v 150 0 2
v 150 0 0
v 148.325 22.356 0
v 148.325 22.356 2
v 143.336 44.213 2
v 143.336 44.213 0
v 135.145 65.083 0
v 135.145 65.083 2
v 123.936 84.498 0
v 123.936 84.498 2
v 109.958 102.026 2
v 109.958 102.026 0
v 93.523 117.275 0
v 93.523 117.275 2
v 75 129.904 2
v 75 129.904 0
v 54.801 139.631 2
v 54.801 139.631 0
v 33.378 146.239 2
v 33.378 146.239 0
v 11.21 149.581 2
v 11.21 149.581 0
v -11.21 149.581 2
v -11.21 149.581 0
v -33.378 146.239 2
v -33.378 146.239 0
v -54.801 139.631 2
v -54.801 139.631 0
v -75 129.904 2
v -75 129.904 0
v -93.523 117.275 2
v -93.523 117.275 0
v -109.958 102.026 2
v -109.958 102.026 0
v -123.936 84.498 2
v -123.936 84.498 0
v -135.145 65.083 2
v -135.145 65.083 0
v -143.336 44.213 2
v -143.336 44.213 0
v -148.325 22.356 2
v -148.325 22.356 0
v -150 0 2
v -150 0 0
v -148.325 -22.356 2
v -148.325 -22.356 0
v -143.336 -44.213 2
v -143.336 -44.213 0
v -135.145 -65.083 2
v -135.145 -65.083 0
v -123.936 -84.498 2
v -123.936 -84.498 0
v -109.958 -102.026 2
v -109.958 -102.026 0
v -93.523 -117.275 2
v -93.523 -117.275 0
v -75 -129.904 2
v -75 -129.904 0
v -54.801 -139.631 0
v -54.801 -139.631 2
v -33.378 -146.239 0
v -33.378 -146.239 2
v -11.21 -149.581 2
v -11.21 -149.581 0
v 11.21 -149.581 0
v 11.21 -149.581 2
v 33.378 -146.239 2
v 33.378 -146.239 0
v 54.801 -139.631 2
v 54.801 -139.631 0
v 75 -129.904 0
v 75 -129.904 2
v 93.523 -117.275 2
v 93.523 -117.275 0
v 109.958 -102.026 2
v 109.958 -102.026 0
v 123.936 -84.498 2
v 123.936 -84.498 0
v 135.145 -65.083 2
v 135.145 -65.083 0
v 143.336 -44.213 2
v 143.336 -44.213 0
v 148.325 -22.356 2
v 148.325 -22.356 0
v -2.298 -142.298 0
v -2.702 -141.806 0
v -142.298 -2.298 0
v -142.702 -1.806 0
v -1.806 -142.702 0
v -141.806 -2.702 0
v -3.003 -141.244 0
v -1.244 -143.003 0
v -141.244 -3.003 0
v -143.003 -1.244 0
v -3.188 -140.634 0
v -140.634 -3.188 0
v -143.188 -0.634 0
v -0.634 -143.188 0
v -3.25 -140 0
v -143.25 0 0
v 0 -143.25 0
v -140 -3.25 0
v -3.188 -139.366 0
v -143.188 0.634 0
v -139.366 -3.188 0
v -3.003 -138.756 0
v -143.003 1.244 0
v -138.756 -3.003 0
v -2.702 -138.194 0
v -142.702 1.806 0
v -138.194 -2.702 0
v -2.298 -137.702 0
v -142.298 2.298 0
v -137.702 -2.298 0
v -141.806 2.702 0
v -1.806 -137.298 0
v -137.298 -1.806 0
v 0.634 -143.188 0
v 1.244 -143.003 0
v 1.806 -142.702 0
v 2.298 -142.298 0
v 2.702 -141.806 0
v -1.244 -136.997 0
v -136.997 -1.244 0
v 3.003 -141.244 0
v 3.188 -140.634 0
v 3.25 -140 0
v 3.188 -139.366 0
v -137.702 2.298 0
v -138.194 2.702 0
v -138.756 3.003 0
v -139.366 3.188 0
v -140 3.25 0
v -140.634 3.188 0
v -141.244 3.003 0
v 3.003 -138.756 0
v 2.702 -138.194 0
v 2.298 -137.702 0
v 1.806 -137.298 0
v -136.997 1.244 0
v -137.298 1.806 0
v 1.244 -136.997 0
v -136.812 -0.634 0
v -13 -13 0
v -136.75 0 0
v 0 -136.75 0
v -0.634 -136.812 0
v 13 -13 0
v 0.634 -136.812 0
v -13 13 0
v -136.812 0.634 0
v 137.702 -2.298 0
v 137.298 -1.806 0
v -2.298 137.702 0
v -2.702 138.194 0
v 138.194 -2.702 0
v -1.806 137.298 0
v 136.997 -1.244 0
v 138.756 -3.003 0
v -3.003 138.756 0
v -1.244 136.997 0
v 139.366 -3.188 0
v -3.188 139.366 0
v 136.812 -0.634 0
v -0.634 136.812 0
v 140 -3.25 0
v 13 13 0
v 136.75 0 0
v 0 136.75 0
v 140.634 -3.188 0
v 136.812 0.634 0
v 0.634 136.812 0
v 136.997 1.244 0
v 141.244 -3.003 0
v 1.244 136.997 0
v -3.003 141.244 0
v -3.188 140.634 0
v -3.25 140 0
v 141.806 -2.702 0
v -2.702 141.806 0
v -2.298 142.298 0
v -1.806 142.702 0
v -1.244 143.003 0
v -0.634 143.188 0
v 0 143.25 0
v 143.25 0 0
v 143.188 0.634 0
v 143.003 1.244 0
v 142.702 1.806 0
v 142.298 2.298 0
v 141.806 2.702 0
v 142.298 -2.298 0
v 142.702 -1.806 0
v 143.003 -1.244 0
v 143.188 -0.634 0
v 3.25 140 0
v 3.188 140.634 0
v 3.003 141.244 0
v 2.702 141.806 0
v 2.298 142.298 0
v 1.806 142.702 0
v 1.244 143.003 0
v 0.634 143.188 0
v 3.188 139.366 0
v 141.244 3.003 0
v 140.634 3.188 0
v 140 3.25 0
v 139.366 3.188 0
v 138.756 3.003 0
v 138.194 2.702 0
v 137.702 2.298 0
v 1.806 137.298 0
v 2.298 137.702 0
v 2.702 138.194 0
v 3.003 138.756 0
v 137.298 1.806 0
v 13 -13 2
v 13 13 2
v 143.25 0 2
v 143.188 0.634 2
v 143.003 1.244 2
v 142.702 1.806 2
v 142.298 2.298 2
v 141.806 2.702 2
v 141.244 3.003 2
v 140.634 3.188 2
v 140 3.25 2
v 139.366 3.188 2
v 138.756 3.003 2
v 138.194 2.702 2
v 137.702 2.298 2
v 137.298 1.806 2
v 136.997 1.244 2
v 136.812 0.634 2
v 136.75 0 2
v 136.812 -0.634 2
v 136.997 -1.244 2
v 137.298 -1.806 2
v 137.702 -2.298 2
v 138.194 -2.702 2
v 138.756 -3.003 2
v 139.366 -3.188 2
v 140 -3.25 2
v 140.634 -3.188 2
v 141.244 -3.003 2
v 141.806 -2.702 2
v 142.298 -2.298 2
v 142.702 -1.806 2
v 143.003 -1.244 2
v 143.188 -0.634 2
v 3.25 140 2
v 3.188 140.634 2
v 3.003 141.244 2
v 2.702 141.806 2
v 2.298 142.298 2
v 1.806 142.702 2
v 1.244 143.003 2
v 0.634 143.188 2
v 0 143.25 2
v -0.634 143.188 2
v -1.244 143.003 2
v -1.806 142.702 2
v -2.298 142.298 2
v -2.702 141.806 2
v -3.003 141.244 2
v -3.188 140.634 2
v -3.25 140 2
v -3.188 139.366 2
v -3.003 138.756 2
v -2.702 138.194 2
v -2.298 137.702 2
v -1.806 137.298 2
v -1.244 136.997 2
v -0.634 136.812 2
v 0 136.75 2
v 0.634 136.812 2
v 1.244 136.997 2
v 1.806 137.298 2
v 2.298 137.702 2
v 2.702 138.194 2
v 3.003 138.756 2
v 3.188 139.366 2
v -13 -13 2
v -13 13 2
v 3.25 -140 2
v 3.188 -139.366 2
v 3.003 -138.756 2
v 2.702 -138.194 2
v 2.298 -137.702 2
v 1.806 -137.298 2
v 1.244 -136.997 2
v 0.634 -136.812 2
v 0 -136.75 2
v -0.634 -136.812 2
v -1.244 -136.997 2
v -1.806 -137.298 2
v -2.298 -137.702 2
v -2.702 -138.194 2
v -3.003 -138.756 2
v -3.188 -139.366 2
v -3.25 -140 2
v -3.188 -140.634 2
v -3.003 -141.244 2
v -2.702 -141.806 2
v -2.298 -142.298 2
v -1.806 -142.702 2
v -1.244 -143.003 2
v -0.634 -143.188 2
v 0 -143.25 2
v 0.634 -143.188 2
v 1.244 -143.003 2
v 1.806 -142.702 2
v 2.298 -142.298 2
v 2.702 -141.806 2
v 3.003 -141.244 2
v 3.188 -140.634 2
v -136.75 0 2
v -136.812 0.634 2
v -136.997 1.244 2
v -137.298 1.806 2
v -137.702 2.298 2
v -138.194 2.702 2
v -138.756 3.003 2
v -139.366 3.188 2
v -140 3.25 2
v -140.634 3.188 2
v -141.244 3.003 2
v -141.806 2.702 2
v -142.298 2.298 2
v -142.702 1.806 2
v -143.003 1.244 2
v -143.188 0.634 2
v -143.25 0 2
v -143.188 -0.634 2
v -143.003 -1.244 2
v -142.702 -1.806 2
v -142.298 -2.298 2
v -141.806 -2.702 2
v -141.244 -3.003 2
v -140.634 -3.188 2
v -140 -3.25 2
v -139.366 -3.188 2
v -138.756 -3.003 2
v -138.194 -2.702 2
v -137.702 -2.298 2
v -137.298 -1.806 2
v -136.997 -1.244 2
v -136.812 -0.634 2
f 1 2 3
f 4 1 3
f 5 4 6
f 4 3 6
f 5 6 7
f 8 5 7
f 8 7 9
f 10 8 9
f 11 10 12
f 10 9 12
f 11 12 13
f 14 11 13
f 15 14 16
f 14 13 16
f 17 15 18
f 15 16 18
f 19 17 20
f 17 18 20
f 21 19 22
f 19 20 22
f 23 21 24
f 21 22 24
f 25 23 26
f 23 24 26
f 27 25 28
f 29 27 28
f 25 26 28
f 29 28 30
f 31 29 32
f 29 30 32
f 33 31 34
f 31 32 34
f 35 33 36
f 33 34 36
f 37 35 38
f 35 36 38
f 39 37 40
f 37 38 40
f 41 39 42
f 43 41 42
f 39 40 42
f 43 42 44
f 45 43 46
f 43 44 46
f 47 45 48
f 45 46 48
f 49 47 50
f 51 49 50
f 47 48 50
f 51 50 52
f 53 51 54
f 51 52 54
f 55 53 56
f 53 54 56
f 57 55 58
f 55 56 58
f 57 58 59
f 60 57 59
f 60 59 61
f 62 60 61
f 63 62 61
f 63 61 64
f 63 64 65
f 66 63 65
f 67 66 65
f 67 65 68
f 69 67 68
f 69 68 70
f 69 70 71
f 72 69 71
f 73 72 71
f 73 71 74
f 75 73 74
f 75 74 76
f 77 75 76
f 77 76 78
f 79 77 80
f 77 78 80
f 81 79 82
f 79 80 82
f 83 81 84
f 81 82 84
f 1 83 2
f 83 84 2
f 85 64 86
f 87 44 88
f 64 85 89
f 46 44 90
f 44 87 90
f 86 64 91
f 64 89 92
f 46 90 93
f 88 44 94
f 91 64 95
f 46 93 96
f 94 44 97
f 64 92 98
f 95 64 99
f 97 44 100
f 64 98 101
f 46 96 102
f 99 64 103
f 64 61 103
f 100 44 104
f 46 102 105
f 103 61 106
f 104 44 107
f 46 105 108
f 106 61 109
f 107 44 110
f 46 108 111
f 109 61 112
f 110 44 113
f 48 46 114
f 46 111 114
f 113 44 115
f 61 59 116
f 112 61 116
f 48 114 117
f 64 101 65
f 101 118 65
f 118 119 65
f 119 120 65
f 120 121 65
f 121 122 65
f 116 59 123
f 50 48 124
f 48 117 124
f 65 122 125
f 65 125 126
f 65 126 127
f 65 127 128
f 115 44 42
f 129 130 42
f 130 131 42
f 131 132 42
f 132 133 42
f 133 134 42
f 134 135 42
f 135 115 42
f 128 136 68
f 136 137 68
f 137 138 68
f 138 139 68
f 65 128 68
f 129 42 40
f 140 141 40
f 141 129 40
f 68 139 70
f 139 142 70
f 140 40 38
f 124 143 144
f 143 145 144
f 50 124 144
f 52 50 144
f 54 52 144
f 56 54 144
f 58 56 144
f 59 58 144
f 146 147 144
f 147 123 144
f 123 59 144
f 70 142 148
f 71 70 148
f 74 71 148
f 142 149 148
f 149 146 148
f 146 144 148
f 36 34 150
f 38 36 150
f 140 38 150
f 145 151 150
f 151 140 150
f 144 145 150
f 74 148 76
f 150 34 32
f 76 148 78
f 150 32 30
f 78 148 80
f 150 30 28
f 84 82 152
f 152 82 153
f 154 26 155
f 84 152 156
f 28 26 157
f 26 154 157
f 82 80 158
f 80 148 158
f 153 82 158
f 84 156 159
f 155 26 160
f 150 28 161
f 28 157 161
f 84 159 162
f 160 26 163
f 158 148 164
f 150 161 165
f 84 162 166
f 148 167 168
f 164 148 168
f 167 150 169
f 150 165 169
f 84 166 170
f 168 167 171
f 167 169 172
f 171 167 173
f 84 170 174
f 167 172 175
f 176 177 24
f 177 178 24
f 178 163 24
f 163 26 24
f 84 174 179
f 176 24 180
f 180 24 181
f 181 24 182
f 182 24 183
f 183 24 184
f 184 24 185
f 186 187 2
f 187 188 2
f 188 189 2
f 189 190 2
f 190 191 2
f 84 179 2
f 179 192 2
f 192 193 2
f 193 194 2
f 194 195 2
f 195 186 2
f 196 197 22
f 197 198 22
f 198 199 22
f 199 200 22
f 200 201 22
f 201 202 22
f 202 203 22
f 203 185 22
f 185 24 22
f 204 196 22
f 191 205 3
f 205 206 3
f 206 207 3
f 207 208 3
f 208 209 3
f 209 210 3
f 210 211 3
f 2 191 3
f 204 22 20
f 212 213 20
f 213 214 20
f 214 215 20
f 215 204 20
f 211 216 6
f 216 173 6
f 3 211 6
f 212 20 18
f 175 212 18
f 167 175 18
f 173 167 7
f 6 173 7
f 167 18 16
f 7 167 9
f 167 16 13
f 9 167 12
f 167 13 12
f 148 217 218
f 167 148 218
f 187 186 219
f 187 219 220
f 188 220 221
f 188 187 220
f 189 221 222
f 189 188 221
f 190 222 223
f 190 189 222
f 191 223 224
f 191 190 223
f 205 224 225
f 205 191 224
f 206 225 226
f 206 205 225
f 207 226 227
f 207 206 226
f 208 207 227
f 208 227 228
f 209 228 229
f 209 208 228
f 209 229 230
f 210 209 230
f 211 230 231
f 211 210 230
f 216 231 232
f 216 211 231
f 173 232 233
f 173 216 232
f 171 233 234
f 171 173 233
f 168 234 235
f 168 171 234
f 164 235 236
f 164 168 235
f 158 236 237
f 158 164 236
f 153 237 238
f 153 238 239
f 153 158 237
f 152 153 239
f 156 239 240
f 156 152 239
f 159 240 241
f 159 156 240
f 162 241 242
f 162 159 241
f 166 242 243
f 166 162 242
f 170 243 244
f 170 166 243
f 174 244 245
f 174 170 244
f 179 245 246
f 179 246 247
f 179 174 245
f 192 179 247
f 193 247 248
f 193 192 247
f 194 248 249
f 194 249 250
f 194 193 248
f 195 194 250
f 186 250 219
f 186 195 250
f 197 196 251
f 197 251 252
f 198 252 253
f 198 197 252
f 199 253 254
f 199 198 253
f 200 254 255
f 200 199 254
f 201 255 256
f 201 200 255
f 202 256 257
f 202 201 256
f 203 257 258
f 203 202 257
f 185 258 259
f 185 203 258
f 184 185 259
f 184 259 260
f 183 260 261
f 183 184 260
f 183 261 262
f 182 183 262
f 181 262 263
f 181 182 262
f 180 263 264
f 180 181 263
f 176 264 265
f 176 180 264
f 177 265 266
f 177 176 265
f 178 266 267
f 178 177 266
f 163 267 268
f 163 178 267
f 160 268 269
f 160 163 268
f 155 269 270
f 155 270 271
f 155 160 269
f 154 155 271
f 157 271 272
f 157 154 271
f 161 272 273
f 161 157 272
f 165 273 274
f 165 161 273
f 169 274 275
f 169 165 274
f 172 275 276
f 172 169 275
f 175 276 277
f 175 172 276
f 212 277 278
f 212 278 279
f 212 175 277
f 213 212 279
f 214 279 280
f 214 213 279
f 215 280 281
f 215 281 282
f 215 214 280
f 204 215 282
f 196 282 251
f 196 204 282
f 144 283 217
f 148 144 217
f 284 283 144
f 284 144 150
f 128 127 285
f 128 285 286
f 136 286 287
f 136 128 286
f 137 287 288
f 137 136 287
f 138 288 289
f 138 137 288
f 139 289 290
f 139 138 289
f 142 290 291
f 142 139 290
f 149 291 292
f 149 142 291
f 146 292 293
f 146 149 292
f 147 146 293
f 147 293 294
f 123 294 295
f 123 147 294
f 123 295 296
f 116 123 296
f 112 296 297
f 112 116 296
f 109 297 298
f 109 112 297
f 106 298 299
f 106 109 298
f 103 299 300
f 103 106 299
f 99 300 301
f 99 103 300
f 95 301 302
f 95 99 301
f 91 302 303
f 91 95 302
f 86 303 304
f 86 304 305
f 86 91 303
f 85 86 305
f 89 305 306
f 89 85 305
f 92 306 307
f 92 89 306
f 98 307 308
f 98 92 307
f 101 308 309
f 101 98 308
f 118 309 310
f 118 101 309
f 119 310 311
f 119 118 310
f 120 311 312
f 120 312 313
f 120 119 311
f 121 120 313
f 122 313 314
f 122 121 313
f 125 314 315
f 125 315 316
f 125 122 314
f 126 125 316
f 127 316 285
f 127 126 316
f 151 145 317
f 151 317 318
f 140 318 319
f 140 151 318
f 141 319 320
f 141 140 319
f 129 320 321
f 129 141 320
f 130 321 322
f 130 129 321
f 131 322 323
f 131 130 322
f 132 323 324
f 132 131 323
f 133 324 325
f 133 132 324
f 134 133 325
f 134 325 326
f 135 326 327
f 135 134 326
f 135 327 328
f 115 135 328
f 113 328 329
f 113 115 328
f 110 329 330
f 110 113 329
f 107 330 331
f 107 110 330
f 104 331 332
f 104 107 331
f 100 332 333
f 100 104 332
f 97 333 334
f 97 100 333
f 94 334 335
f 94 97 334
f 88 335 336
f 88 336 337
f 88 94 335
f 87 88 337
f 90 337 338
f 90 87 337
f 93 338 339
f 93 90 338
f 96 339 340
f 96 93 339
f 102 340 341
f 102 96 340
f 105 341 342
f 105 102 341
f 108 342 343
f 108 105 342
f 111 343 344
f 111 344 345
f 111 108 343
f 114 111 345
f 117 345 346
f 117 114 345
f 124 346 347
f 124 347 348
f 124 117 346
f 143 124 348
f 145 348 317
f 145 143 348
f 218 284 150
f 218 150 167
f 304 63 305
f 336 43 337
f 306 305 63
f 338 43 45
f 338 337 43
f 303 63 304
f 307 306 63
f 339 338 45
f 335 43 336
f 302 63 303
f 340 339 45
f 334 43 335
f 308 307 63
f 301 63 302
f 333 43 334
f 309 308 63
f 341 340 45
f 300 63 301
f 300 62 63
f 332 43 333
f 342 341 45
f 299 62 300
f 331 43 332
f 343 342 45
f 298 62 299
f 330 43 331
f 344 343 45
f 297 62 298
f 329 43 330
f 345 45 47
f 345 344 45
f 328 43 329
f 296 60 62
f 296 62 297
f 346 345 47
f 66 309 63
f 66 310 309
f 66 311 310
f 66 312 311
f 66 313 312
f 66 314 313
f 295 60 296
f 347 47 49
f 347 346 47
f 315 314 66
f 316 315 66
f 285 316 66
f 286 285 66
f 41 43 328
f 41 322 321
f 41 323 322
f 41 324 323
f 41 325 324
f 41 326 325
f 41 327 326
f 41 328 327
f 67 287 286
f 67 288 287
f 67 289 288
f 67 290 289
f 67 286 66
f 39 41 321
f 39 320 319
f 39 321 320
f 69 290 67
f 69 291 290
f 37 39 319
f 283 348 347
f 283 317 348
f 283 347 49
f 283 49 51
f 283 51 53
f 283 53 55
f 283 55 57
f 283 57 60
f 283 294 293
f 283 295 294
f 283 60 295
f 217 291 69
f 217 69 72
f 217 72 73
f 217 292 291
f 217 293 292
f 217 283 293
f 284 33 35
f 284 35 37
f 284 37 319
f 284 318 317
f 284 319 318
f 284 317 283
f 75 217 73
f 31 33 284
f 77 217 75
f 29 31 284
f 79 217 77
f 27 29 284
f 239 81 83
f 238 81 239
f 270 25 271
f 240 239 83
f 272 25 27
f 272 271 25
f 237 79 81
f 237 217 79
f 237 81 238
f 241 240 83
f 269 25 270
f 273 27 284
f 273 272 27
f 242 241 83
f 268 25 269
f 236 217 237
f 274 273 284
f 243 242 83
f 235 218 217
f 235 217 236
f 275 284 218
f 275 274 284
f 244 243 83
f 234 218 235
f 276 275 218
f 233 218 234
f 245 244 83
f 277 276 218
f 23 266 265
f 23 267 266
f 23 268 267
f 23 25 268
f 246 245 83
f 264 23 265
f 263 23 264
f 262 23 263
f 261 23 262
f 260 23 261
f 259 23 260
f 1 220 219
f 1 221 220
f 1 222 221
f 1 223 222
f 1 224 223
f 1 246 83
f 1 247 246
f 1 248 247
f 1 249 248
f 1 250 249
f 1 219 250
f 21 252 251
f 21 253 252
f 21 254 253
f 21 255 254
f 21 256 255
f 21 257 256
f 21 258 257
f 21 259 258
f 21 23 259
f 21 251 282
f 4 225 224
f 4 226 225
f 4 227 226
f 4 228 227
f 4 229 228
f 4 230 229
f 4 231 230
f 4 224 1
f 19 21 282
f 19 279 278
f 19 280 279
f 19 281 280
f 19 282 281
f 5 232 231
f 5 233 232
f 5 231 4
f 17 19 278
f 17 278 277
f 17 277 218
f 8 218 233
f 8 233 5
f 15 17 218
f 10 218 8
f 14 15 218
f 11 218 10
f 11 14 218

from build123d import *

# Parameters (mm, degrees)
CROQUIS1_R              = 150
CROQUIS1_R_2            = 3.25
SALIENTE_EXTRUIR1_DEPTH = 2
CROQUIS2_W              = 26
CROQUIS2_H              = 26
CORTAR_EXTRUIR1_DEPTH   = 213.141462237


with BuildPart() as part:
    # Croquis1 → Saliente-Extruir1 (new body)
    with BuildSketch(Plane.XY):
        Circle(CROQUIS1_R)
        with Locations((140, 0)):
            Circle(CROQUIS1_R_2, mode=Mode.SUBTRACT)
        with Locations((0, -140)):
            Circle(CROQUIS1_R_2, mode=Mode.SUBTRACT)
        with Locations((-140, 0)):
            Circle(CROQUIS1_R_2, mode=Mode.SUBTRACT)
        with Locations((0, 140)):
            Circle(CROQUIS1_R_2, mode=Mode.SUBTRACT)
    extrude(amount=SALIENTE_EXTRUIR1_DEPTH)

    # Croquis2 → Cortar-Extruir1 (cut, through all)
    with BuildSketch(Plane.XY.offset(2)):
        Rectangle(CROQUIS2_W, CROQUIS2_H)
    extrude(amount=-CORTAR_EXTRUIR1_DEPTH, mode=Mode.SUBTRACT)


solid = part.part
